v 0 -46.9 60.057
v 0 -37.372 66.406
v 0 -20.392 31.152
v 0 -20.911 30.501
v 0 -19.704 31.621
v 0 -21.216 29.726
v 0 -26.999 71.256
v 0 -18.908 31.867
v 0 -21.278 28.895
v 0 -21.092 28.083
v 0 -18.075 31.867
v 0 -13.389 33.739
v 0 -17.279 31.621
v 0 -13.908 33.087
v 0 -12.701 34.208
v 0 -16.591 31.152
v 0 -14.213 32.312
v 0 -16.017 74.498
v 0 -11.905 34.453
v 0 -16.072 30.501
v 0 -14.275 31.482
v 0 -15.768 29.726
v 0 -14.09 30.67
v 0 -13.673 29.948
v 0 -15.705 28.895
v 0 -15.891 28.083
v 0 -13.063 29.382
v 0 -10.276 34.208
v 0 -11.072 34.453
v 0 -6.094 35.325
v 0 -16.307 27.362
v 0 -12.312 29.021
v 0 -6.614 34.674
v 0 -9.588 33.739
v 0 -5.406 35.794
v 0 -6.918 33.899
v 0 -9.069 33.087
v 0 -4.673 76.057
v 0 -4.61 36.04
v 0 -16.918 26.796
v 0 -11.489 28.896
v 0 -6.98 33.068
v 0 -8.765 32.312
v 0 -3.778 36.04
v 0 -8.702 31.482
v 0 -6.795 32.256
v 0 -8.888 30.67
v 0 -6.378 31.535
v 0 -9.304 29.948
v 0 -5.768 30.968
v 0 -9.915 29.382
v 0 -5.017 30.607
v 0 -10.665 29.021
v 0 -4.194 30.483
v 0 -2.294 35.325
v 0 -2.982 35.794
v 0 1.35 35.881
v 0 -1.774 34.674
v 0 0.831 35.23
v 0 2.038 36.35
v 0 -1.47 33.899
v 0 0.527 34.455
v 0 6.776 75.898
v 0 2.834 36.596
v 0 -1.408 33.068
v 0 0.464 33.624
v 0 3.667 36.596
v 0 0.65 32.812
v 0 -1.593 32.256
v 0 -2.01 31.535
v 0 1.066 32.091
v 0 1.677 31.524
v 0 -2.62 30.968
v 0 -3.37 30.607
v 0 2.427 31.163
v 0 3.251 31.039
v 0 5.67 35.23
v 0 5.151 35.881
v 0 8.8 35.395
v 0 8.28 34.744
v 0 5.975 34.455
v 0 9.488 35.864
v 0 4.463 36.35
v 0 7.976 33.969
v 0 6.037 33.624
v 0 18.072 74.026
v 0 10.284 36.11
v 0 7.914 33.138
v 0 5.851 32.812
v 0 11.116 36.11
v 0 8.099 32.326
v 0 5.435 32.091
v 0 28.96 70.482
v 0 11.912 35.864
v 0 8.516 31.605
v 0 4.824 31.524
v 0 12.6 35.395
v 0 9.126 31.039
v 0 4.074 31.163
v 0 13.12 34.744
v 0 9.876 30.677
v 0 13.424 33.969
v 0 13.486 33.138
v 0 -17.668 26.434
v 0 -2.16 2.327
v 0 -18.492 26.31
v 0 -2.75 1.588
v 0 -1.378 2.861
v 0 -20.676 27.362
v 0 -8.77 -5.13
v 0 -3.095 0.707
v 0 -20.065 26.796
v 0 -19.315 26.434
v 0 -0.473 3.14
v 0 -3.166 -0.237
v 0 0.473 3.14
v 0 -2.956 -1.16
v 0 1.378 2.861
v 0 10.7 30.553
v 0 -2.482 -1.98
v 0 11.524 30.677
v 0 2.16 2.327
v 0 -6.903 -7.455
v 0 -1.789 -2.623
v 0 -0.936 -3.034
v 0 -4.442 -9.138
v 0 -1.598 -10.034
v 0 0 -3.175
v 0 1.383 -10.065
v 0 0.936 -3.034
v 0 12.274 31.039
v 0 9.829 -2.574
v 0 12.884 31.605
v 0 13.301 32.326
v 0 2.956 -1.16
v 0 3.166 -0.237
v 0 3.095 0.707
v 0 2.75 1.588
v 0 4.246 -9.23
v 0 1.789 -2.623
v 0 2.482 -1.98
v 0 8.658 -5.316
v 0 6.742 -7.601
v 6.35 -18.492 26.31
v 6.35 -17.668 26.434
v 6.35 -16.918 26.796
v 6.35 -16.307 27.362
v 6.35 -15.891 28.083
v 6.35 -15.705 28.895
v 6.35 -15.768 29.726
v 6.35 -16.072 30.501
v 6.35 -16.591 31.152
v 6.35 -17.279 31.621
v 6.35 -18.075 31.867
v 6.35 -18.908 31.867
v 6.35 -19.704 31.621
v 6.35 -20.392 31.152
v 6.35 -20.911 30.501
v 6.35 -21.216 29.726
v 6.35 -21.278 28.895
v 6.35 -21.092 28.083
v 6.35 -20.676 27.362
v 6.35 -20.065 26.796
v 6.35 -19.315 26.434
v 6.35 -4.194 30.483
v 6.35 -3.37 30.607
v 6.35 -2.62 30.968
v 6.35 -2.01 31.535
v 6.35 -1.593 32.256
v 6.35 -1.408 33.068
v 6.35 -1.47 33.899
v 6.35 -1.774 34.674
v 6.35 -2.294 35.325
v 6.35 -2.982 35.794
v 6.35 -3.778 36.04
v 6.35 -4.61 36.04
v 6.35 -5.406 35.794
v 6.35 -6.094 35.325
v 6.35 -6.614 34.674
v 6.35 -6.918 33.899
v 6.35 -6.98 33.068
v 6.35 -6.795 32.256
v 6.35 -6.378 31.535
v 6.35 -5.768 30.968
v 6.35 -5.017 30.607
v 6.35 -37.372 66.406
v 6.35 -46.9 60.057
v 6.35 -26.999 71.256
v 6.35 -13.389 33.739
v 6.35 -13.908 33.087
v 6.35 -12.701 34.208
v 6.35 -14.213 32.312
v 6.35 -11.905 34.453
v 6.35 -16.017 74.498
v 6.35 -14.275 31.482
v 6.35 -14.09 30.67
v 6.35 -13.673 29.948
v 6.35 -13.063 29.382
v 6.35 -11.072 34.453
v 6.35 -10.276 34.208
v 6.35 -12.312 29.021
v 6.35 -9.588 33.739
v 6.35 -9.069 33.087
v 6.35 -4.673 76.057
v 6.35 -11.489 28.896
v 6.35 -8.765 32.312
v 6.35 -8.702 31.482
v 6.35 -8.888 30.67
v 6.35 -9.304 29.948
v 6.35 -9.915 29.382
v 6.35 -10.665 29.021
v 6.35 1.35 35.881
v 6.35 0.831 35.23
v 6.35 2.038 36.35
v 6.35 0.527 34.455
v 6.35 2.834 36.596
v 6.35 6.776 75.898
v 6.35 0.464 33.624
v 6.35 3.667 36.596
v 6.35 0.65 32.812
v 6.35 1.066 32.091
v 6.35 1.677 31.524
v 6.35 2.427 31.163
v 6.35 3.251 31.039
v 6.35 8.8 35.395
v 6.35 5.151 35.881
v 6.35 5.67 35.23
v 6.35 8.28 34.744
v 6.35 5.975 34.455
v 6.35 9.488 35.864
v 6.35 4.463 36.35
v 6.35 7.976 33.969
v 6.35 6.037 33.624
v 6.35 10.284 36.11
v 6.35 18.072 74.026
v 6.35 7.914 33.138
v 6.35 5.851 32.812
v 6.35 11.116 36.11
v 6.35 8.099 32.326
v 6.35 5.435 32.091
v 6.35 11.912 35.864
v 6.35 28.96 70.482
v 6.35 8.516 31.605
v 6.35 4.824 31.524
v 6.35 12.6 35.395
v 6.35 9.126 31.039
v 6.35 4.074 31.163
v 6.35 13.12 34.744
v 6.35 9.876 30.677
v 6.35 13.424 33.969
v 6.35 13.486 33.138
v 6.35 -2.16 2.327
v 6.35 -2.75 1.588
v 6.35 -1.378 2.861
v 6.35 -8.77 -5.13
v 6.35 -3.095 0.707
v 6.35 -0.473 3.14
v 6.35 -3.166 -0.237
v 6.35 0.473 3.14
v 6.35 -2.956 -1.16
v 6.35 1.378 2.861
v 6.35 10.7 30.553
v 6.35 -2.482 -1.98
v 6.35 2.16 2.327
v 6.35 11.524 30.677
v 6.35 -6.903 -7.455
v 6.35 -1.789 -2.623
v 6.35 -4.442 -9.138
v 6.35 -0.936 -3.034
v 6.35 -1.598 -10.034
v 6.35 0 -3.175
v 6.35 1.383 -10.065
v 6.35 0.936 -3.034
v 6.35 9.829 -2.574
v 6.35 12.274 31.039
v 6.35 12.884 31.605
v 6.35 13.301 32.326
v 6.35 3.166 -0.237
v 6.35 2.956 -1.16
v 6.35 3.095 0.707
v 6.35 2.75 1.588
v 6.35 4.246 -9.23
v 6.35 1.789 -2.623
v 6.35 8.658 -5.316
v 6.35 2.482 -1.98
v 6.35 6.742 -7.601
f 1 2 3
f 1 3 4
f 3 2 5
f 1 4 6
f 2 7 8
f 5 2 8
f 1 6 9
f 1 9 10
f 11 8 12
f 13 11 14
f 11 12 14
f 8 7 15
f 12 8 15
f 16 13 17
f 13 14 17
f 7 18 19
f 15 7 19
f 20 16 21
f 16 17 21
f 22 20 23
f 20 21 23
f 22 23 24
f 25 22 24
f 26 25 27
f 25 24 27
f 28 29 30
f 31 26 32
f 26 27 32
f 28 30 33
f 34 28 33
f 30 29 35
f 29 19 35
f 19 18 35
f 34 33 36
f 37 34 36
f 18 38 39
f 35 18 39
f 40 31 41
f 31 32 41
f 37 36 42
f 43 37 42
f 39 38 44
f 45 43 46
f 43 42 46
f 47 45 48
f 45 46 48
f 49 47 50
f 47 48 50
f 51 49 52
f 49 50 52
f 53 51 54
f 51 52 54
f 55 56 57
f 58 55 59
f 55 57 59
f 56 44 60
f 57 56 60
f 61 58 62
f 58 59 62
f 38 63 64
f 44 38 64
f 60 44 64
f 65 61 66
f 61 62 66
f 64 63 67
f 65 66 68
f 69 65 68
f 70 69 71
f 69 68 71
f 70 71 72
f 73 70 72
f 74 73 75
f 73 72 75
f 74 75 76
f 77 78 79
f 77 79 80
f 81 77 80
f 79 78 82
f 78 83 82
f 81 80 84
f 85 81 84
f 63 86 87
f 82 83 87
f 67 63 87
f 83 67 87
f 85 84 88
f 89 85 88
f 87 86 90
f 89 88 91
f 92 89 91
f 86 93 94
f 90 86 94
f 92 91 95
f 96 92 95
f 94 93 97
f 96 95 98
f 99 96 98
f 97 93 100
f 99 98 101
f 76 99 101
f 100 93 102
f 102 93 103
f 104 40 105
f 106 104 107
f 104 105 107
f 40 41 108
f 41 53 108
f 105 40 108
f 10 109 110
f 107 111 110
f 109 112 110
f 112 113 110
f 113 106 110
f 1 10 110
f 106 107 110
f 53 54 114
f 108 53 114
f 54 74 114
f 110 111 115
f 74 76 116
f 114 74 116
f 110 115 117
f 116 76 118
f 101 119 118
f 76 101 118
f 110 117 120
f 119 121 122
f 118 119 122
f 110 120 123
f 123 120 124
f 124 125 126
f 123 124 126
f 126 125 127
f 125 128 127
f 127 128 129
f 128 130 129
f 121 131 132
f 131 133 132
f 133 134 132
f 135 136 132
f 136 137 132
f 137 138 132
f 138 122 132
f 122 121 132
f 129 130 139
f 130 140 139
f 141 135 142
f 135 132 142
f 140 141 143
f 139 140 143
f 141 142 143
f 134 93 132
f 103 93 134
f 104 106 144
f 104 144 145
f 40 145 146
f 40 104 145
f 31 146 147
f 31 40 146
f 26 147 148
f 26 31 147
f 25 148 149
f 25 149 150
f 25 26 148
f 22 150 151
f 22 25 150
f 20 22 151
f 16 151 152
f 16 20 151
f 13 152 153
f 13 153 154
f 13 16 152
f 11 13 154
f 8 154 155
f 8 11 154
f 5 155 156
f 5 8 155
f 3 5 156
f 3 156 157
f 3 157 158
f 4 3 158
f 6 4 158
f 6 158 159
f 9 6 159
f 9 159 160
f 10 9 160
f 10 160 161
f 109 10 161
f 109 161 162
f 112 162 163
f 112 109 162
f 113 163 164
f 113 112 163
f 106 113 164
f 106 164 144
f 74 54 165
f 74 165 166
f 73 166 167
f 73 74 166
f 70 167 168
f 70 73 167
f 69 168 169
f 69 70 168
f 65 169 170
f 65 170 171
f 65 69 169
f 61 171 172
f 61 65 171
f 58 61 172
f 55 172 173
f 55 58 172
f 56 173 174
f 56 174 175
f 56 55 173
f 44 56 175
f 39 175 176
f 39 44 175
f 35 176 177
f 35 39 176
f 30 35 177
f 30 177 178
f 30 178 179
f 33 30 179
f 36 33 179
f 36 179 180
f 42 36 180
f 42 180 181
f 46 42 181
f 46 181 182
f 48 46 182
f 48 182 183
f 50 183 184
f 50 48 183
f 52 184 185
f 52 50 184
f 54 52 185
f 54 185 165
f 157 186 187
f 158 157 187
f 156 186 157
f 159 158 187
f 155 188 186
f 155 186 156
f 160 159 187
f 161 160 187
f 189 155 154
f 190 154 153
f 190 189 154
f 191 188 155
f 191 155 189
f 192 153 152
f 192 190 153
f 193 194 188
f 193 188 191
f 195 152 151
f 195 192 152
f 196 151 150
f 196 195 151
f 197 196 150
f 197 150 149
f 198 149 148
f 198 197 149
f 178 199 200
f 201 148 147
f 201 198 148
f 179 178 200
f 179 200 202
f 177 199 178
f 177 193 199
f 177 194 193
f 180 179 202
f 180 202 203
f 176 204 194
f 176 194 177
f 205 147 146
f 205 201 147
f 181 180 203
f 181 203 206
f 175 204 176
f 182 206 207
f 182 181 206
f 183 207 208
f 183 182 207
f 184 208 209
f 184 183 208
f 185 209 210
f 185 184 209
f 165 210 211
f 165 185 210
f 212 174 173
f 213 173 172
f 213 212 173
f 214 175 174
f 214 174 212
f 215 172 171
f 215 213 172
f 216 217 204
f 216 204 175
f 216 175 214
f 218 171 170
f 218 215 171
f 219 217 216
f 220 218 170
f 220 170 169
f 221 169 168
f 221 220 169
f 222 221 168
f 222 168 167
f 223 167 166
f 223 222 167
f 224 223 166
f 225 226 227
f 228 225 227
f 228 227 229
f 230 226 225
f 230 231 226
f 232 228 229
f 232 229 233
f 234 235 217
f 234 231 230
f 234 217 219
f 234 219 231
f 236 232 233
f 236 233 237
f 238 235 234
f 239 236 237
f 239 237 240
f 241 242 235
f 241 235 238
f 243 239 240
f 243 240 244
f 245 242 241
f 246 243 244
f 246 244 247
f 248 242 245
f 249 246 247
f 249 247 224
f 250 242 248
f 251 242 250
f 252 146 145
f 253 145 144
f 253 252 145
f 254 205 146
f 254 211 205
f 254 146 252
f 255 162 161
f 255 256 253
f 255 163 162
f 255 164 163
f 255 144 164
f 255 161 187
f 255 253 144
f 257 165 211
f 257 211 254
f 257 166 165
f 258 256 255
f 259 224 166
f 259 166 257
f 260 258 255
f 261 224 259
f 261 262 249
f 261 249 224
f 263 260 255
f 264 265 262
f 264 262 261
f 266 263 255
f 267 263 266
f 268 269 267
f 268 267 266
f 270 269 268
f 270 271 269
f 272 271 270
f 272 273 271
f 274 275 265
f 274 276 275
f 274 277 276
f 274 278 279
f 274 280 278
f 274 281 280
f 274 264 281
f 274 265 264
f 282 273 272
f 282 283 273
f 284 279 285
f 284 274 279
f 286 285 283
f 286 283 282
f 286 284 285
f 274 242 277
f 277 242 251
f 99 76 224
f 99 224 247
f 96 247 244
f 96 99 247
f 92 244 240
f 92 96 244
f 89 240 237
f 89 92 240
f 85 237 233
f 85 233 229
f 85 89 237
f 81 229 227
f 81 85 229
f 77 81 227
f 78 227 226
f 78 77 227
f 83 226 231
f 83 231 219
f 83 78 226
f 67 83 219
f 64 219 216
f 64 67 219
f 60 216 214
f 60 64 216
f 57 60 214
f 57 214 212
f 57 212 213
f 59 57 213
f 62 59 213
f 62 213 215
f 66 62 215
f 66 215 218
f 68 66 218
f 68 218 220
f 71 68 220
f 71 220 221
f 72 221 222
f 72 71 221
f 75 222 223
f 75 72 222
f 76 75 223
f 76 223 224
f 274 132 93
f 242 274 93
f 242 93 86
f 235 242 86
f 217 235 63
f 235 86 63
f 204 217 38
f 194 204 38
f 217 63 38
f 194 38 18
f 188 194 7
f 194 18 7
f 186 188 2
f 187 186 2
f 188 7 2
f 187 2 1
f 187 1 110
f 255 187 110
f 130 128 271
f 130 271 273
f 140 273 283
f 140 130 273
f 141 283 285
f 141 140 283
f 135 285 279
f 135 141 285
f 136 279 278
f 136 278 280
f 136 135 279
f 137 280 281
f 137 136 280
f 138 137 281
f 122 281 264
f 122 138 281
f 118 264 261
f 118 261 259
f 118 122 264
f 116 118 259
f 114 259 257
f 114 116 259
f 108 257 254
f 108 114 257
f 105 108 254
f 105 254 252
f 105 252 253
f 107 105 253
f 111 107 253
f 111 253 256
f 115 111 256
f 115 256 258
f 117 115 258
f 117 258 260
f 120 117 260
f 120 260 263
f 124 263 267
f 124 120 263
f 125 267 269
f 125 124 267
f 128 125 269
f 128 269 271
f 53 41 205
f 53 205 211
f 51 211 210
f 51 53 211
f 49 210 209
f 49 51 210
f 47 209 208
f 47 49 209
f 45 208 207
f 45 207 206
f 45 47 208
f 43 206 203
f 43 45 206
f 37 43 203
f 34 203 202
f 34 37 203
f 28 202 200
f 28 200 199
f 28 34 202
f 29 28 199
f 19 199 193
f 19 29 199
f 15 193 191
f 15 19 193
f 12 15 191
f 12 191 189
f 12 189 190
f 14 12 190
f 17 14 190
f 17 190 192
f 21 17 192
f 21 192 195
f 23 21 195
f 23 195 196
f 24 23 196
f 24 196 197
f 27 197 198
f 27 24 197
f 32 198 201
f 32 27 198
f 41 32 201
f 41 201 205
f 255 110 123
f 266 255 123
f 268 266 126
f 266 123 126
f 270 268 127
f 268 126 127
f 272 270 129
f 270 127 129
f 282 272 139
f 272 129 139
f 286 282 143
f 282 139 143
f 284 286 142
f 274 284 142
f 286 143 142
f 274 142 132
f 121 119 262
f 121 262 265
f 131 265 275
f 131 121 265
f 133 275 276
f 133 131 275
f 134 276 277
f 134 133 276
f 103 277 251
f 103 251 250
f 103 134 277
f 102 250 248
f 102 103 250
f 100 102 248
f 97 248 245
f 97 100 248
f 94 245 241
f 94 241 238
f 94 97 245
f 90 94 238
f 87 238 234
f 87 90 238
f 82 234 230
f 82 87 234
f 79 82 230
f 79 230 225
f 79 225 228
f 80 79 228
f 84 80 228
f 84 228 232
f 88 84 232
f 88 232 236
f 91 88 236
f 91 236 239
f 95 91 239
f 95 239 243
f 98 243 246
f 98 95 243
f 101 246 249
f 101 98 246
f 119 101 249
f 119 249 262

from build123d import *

# Parameters (mm, degrees)
SKETCH1_R           = 2.794
SKETCH1_R_2         = 3.175
BOSS_EXTRUDE1_DEPTH = 6.35


with BuildPart() as part:
    # Sketch1 → Boss-Extrude1 (new body)
    with BuildSketch(Plane(origin=(0, 0, 0), x_dir=(0, 0, -1), z_dir=(1, 0, 0))):
        with BuildLine():
            Line((2.573887506, 9.828565669), (-70.482178955, 28.960359974))
            ThreePointArc((-70.482178955, 28.960359974), (-75.490460705, -10.374504448), (-60.056829366, -46.900077255))
            Line((-60.056829366, -46.900077255), (5.129832124, -8.769858743))
            ThreePointArc((5.129832124, -8.769858743), (10.065394761, 1.38326726), (2.573887506, 9.828565669))
        make_face()
        with Locations((-33.347167041, 10.699986838)):
            Circle(SKETCH1_R, mode=Mode.SUBTRACT)
        with Locations((-33.832816449, 3.25056569)):
            Circle(SKETCH1_R, mode=Mode.SUBTRACT)
        with Locations((-33.276980509, -4.193947538)):
            Circle(SKETCH1_R, mode=Mode.SUBTRACT)
        with Locations((-31.690477935, -11.488653864)):
            Circle(SKETCH1_R, mode=Mode.SUBTRACT)
        with Locations((-29.104188196, -18.491570126)):
            Circle(SKETCH1_R, mode=Mode.SUBTRACT)
        Circle(SKETCH1_R_2, mode=Mode.SUBTRACT)
    extrude(amount=BOSS_EXTRUDE1_DEPTH)


solid = part.part
